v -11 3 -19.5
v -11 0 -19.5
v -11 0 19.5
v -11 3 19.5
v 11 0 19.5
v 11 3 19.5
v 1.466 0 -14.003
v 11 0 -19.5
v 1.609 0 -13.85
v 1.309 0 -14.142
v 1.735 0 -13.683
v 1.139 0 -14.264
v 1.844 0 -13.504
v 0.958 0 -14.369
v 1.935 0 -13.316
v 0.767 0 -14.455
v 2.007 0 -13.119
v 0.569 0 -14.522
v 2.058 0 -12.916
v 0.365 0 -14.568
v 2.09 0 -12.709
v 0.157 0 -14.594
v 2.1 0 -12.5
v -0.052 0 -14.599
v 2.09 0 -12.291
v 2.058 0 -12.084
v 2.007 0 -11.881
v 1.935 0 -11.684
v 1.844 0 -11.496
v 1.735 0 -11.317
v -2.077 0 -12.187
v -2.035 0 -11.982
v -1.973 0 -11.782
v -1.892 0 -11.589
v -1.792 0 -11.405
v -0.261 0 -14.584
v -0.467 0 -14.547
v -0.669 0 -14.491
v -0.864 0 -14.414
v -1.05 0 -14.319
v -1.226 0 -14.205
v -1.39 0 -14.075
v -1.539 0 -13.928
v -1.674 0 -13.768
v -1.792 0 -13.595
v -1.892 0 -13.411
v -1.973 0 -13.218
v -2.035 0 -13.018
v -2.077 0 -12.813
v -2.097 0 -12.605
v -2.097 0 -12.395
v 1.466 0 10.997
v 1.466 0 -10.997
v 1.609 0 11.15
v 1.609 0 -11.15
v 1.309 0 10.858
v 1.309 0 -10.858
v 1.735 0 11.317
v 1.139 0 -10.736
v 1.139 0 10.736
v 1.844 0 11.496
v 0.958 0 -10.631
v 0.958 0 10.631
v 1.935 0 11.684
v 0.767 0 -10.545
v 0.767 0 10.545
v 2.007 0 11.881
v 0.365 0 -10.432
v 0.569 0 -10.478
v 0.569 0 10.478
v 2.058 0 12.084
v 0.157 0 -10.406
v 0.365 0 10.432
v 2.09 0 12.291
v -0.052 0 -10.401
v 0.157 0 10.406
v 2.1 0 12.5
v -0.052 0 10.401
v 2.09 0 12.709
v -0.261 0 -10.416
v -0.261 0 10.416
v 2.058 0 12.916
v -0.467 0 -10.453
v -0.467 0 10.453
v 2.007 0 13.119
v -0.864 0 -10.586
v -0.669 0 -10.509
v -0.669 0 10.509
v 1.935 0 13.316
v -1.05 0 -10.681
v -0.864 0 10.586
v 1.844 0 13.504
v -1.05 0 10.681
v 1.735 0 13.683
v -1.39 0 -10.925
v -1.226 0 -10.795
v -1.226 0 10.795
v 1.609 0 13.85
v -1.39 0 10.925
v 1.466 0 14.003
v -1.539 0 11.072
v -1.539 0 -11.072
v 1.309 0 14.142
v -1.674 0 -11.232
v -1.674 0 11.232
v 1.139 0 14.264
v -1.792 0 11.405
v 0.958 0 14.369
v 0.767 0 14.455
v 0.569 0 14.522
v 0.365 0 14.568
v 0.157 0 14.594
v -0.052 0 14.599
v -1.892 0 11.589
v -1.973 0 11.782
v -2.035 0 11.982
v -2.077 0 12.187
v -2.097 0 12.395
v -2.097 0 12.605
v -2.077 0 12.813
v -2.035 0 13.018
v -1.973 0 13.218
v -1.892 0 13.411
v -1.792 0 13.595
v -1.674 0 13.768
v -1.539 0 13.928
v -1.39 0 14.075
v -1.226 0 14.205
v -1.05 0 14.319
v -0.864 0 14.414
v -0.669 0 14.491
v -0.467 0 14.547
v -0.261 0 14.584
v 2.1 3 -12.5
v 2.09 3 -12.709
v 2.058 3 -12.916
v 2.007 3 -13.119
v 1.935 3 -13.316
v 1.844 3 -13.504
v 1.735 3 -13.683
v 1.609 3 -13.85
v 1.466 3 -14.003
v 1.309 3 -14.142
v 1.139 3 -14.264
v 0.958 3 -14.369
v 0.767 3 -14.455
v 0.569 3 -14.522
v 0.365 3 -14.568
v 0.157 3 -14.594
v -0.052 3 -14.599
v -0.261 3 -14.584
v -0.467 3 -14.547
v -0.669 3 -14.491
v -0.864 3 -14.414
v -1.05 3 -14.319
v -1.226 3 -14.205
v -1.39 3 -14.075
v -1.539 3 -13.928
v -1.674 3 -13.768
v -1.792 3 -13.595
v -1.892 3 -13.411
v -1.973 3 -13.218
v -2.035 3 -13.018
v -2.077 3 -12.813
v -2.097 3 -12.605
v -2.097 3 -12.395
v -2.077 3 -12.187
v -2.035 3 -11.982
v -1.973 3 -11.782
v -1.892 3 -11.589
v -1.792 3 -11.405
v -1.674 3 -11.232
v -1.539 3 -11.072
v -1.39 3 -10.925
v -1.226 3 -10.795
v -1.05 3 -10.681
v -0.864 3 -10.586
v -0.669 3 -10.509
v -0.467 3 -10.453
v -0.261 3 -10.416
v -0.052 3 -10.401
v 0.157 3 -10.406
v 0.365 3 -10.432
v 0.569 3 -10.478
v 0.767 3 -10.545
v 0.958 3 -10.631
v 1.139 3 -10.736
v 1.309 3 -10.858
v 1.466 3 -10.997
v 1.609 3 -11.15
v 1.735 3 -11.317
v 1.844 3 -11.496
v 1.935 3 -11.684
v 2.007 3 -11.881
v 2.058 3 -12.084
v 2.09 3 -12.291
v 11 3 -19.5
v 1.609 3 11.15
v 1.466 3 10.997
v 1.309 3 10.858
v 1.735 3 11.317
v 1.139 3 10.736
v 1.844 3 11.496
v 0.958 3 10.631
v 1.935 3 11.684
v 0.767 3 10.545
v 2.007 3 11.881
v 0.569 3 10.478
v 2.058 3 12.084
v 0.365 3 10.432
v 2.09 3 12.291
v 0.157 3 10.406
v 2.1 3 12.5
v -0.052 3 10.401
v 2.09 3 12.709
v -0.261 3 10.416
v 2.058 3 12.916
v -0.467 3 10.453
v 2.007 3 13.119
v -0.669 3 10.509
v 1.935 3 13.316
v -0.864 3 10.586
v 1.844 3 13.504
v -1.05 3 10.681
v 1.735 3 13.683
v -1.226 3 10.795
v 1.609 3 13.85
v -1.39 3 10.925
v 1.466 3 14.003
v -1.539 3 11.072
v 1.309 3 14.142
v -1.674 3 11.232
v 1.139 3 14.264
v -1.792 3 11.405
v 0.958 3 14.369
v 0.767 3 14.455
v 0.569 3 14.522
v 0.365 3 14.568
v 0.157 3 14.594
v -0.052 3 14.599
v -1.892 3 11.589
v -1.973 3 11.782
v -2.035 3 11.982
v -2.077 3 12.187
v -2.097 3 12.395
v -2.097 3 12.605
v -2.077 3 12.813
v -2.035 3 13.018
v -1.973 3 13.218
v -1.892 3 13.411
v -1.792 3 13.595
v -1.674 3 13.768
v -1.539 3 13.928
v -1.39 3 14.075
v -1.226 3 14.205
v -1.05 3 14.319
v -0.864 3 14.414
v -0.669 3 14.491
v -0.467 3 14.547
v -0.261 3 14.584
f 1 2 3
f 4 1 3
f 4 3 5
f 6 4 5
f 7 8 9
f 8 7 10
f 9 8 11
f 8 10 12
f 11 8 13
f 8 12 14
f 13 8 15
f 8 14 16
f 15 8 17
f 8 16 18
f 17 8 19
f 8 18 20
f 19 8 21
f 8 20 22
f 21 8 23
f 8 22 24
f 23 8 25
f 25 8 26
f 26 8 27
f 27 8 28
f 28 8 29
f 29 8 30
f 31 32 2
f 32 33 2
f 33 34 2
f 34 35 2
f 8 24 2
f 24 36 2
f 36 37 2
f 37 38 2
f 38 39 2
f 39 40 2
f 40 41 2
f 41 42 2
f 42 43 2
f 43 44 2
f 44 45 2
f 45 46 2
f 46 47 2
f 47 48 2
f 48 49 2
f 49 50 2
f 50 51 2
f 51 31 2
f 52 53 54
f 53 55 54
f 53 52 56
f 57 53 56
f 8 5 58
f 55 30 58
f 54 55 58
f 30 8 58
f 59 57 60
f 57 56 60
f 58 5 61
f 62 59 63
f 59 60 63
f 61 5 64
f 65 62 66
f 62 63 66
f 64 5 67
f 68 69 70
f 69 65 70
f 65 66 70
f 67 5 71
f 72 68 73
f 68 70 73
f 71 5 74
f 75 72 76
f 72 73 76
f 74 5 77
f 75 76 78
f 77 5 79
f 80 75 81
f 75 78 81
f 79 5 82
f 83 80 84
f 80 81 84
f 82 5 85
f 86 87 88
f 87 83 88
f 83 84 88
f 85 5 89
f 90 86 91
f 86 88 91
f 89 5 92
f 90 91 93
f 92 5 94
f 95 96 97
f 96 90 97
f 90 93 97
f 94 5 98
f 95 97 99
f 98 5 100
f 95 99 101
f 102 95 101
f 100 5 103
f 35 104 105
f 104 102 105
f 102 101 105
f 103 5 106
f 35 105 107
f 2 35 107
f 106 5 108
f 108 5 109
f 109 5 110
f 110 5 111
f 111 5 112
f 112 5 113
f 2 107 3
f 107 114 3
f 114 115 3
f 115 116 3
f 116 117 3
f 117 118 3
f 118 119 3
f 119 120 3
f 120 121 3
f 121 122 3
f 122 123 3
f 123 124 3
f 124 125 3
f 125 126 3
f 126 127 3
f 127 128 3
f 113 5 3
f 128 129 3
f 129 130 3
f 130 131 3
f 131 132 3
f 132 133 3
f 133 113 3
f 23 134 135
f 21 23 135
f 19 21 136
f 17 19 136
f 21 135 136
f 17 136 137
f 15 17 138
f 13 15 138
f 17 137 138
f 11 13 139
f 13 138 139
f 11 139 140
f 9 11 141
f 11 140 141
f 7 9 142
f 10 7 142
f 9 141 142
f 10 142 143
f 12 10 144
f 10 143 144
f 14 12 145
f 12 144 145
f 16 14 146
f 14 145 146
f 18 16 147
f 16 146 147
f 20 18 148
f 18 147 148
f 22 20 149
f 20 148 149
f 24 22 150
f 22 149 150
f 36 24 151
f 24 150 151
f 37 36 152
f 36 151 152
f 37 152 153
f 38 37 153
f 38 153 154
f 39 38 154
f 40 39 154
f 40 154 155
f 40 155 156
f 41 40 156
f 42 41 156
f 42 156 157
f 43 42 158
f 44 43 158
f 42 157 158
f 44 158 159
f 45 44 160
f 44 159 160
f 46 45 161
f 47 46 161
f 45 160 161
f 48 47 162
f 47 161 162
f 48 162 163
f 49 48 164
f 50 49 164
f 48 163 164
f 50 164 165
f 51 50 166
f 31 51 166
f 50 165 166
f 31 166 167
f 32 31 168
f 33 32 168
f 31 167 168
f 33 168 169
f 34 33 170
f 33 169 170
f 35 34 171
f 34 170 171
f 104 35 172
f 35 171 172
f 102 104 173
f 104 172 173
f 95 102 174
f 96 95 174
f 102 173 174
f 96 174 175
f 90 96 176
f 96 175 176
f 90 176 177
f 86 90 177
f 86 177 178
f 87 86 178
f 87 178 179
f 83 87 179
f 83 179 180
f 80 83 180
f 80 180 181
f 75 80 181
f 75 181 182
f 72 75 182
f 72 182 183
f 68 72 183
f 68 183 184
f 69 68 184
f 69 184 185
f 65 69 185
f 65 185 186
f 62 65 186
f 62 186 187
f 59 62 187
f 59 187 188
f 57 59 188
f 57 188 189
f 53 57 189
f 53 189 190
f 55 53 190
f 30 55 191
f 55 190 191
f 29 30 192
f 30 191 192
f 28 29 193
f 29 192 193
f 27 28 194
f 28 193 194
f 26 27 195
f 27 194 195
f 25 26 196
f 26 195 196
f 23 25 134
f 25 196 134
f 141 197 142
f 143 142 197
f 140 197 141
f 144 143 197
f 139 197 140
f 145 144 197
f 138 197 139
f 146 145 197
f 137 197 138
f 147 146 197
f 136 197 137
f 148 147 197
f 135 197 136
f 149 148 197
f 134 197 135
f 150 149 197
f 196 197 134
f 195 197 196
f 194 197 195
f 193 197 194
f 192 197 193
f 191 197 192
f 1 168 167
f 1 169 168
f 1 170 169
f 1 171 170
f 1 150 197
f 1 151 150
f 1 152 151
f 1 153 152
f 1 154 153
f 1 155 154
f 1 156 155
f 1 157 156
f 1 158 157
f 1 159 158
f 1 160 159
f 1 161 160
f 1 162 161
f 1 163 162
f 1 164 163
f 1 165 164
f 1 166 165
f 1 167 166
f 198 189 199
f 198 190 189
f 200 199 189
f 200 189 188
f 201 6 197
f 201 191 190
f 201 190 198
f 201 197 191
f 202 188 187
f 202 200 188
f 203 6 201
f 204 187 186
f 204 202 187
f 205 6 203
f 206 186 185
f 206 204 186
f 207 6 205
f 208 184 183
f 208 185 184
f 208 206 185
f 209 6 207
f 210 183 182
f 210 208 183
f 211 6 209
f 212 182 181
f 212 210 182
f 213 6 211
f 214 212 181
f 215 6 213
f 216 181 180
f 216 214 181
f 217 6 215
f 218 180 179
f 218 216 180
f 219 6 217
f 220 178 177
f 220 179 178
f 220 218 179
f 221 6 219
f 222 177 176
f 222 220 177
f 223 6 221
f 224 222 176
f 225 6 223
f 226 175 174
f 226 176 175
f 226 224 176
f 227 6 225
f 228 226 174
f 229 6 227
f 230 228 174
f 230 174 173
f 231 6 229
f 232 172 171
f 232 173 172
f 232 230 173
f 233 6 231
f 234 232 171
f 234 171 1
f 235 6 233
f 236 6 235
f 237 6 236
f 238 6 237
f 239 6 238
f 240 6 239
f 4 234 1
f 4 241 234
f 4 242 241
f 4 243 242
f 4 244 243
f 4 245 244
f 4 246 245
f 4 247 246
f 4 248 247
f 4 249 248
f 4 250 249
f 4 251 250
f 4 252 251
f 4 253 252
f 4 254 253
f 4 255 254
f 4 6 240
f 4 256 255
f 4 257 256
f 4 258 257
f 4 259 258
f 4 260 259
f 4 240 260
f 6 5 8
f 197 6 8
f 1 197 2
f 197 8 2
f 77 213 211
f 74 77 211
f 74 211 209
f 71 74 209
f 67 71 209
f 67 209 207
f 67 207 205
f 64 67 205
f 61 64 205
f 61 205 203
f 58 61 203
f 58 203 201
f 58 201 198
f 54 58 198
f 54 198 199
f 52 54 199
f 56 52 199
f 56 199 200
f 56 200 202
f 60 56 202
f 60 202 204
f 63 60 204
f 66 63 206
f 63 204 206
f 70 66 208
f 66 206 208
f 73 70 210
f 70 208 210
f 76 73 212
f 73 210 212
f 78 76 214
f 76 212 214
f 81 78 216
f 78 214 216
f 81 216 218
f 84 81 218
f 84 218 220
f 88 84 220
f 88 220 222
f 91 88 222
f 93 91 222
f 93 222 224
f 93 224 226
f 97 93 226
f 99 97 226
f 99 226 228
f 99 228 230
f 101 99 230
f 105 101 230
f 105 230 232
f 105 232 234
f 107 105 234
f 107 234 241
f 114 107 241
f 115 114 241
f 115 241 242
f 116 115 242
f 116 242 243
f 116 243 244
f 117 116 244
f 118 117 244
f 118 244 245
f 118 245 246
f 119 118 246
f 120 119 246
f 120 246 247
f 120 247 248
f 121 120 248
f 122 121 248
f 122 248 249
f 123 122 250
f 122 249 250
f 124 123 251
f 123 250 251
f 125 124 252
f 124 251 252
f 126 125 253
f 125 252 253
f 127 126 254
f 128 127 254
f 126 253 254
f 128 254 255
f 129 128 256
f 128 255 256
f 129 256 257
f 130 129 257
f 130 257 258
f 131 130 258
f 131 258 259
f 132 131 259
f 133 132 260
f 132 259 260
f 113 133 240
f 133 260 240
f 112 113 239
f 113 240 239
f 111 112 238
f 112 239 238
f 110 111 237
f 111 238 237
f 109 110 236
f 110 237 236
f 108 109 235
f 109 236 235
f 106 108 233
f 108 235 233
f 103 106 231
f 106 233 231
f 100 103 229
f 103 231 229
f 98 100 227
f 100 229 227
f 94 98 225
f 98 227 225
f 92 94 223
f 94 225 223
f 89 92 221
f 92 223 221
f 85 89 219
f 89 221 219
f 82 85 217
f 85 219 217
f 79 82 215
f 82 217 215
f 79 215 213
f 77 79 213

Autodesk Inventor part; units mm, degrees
ref_plane "YZ Plane" through (0, 0, 0) normal (1, 0, 0) x (0, 1, 0)
ref_plane "XZ Plane" through (0, 0, 0) normal (0, 1, 0) x (-1, 0, 0)
ref_plane "XY Plane" through (0, 0, 0) normal (0, 0, 1) x (1, 0, 0)
sketch "Sketch1" plane through (0, 0, 0) normal (0, 1, 0) x (-1, 0, 0)
  line L0 (11, 19.5) -> (-11, 19.5)
  line L1 (-11, 19.5) -> (-11, -19.5)
  line L2 (-11, -19.5) -> (11, -19.5)
  line L3 (11, -19.5) -> (11, 19.5)
  line L4 (11, 19.5) -> (-11, -19.5) construction
  line L5 (-11, 19.5) -> (11, -19.5) construction
  point P0 (0, 0)
  dimension "d0" = 22
  dimension "d1" = 39
extrude "Plate1" add sketch "Sketch1" along normal blind 3
sketch "Sketch2" plane through (0, 3, 0) normal (0, 1, 0) x (1, 0, 0)
  circle A0 centre (0, -12.5) radius 2.1
  line L0 (11, -19.5) -> (11, 19.5) projected
  line L1 (11, 0) -> (-11, 0)
  line L2 (-11, 19.5) -> (-11, -19.5) projected
  circle A1 centre (0, 12.5) radius 2.1
  point P0 (0, 0)
  dimension "d3" = 4.2
  dimension "d4" = 12.5
extrude "Cut1" cut sketch "Sketch2" against normal blind 3
equation "\"d5\" = Thickness"
equation "\"d2\" = Thickness"
equation "\"BendRadius\" = Thickness"
equation "\"BendReliefWidth\" = Thickness"
equation "\"BendReliefDepth\" = 0.5 * Thickness"
equation "\"CornerReliefSize\" = 4 * Thickness"
equation "\"MinimumRemnant\" = 2 * Thickness"
equation "\"TransitionRadius\" = BendRadius"
equation "\"JacobiRadiusSize\" = BendRadius"
equation "\"GapSize\" = Thickness"
equation "\"Thickness\" = 3"
properties part number "90 graders beslag"
